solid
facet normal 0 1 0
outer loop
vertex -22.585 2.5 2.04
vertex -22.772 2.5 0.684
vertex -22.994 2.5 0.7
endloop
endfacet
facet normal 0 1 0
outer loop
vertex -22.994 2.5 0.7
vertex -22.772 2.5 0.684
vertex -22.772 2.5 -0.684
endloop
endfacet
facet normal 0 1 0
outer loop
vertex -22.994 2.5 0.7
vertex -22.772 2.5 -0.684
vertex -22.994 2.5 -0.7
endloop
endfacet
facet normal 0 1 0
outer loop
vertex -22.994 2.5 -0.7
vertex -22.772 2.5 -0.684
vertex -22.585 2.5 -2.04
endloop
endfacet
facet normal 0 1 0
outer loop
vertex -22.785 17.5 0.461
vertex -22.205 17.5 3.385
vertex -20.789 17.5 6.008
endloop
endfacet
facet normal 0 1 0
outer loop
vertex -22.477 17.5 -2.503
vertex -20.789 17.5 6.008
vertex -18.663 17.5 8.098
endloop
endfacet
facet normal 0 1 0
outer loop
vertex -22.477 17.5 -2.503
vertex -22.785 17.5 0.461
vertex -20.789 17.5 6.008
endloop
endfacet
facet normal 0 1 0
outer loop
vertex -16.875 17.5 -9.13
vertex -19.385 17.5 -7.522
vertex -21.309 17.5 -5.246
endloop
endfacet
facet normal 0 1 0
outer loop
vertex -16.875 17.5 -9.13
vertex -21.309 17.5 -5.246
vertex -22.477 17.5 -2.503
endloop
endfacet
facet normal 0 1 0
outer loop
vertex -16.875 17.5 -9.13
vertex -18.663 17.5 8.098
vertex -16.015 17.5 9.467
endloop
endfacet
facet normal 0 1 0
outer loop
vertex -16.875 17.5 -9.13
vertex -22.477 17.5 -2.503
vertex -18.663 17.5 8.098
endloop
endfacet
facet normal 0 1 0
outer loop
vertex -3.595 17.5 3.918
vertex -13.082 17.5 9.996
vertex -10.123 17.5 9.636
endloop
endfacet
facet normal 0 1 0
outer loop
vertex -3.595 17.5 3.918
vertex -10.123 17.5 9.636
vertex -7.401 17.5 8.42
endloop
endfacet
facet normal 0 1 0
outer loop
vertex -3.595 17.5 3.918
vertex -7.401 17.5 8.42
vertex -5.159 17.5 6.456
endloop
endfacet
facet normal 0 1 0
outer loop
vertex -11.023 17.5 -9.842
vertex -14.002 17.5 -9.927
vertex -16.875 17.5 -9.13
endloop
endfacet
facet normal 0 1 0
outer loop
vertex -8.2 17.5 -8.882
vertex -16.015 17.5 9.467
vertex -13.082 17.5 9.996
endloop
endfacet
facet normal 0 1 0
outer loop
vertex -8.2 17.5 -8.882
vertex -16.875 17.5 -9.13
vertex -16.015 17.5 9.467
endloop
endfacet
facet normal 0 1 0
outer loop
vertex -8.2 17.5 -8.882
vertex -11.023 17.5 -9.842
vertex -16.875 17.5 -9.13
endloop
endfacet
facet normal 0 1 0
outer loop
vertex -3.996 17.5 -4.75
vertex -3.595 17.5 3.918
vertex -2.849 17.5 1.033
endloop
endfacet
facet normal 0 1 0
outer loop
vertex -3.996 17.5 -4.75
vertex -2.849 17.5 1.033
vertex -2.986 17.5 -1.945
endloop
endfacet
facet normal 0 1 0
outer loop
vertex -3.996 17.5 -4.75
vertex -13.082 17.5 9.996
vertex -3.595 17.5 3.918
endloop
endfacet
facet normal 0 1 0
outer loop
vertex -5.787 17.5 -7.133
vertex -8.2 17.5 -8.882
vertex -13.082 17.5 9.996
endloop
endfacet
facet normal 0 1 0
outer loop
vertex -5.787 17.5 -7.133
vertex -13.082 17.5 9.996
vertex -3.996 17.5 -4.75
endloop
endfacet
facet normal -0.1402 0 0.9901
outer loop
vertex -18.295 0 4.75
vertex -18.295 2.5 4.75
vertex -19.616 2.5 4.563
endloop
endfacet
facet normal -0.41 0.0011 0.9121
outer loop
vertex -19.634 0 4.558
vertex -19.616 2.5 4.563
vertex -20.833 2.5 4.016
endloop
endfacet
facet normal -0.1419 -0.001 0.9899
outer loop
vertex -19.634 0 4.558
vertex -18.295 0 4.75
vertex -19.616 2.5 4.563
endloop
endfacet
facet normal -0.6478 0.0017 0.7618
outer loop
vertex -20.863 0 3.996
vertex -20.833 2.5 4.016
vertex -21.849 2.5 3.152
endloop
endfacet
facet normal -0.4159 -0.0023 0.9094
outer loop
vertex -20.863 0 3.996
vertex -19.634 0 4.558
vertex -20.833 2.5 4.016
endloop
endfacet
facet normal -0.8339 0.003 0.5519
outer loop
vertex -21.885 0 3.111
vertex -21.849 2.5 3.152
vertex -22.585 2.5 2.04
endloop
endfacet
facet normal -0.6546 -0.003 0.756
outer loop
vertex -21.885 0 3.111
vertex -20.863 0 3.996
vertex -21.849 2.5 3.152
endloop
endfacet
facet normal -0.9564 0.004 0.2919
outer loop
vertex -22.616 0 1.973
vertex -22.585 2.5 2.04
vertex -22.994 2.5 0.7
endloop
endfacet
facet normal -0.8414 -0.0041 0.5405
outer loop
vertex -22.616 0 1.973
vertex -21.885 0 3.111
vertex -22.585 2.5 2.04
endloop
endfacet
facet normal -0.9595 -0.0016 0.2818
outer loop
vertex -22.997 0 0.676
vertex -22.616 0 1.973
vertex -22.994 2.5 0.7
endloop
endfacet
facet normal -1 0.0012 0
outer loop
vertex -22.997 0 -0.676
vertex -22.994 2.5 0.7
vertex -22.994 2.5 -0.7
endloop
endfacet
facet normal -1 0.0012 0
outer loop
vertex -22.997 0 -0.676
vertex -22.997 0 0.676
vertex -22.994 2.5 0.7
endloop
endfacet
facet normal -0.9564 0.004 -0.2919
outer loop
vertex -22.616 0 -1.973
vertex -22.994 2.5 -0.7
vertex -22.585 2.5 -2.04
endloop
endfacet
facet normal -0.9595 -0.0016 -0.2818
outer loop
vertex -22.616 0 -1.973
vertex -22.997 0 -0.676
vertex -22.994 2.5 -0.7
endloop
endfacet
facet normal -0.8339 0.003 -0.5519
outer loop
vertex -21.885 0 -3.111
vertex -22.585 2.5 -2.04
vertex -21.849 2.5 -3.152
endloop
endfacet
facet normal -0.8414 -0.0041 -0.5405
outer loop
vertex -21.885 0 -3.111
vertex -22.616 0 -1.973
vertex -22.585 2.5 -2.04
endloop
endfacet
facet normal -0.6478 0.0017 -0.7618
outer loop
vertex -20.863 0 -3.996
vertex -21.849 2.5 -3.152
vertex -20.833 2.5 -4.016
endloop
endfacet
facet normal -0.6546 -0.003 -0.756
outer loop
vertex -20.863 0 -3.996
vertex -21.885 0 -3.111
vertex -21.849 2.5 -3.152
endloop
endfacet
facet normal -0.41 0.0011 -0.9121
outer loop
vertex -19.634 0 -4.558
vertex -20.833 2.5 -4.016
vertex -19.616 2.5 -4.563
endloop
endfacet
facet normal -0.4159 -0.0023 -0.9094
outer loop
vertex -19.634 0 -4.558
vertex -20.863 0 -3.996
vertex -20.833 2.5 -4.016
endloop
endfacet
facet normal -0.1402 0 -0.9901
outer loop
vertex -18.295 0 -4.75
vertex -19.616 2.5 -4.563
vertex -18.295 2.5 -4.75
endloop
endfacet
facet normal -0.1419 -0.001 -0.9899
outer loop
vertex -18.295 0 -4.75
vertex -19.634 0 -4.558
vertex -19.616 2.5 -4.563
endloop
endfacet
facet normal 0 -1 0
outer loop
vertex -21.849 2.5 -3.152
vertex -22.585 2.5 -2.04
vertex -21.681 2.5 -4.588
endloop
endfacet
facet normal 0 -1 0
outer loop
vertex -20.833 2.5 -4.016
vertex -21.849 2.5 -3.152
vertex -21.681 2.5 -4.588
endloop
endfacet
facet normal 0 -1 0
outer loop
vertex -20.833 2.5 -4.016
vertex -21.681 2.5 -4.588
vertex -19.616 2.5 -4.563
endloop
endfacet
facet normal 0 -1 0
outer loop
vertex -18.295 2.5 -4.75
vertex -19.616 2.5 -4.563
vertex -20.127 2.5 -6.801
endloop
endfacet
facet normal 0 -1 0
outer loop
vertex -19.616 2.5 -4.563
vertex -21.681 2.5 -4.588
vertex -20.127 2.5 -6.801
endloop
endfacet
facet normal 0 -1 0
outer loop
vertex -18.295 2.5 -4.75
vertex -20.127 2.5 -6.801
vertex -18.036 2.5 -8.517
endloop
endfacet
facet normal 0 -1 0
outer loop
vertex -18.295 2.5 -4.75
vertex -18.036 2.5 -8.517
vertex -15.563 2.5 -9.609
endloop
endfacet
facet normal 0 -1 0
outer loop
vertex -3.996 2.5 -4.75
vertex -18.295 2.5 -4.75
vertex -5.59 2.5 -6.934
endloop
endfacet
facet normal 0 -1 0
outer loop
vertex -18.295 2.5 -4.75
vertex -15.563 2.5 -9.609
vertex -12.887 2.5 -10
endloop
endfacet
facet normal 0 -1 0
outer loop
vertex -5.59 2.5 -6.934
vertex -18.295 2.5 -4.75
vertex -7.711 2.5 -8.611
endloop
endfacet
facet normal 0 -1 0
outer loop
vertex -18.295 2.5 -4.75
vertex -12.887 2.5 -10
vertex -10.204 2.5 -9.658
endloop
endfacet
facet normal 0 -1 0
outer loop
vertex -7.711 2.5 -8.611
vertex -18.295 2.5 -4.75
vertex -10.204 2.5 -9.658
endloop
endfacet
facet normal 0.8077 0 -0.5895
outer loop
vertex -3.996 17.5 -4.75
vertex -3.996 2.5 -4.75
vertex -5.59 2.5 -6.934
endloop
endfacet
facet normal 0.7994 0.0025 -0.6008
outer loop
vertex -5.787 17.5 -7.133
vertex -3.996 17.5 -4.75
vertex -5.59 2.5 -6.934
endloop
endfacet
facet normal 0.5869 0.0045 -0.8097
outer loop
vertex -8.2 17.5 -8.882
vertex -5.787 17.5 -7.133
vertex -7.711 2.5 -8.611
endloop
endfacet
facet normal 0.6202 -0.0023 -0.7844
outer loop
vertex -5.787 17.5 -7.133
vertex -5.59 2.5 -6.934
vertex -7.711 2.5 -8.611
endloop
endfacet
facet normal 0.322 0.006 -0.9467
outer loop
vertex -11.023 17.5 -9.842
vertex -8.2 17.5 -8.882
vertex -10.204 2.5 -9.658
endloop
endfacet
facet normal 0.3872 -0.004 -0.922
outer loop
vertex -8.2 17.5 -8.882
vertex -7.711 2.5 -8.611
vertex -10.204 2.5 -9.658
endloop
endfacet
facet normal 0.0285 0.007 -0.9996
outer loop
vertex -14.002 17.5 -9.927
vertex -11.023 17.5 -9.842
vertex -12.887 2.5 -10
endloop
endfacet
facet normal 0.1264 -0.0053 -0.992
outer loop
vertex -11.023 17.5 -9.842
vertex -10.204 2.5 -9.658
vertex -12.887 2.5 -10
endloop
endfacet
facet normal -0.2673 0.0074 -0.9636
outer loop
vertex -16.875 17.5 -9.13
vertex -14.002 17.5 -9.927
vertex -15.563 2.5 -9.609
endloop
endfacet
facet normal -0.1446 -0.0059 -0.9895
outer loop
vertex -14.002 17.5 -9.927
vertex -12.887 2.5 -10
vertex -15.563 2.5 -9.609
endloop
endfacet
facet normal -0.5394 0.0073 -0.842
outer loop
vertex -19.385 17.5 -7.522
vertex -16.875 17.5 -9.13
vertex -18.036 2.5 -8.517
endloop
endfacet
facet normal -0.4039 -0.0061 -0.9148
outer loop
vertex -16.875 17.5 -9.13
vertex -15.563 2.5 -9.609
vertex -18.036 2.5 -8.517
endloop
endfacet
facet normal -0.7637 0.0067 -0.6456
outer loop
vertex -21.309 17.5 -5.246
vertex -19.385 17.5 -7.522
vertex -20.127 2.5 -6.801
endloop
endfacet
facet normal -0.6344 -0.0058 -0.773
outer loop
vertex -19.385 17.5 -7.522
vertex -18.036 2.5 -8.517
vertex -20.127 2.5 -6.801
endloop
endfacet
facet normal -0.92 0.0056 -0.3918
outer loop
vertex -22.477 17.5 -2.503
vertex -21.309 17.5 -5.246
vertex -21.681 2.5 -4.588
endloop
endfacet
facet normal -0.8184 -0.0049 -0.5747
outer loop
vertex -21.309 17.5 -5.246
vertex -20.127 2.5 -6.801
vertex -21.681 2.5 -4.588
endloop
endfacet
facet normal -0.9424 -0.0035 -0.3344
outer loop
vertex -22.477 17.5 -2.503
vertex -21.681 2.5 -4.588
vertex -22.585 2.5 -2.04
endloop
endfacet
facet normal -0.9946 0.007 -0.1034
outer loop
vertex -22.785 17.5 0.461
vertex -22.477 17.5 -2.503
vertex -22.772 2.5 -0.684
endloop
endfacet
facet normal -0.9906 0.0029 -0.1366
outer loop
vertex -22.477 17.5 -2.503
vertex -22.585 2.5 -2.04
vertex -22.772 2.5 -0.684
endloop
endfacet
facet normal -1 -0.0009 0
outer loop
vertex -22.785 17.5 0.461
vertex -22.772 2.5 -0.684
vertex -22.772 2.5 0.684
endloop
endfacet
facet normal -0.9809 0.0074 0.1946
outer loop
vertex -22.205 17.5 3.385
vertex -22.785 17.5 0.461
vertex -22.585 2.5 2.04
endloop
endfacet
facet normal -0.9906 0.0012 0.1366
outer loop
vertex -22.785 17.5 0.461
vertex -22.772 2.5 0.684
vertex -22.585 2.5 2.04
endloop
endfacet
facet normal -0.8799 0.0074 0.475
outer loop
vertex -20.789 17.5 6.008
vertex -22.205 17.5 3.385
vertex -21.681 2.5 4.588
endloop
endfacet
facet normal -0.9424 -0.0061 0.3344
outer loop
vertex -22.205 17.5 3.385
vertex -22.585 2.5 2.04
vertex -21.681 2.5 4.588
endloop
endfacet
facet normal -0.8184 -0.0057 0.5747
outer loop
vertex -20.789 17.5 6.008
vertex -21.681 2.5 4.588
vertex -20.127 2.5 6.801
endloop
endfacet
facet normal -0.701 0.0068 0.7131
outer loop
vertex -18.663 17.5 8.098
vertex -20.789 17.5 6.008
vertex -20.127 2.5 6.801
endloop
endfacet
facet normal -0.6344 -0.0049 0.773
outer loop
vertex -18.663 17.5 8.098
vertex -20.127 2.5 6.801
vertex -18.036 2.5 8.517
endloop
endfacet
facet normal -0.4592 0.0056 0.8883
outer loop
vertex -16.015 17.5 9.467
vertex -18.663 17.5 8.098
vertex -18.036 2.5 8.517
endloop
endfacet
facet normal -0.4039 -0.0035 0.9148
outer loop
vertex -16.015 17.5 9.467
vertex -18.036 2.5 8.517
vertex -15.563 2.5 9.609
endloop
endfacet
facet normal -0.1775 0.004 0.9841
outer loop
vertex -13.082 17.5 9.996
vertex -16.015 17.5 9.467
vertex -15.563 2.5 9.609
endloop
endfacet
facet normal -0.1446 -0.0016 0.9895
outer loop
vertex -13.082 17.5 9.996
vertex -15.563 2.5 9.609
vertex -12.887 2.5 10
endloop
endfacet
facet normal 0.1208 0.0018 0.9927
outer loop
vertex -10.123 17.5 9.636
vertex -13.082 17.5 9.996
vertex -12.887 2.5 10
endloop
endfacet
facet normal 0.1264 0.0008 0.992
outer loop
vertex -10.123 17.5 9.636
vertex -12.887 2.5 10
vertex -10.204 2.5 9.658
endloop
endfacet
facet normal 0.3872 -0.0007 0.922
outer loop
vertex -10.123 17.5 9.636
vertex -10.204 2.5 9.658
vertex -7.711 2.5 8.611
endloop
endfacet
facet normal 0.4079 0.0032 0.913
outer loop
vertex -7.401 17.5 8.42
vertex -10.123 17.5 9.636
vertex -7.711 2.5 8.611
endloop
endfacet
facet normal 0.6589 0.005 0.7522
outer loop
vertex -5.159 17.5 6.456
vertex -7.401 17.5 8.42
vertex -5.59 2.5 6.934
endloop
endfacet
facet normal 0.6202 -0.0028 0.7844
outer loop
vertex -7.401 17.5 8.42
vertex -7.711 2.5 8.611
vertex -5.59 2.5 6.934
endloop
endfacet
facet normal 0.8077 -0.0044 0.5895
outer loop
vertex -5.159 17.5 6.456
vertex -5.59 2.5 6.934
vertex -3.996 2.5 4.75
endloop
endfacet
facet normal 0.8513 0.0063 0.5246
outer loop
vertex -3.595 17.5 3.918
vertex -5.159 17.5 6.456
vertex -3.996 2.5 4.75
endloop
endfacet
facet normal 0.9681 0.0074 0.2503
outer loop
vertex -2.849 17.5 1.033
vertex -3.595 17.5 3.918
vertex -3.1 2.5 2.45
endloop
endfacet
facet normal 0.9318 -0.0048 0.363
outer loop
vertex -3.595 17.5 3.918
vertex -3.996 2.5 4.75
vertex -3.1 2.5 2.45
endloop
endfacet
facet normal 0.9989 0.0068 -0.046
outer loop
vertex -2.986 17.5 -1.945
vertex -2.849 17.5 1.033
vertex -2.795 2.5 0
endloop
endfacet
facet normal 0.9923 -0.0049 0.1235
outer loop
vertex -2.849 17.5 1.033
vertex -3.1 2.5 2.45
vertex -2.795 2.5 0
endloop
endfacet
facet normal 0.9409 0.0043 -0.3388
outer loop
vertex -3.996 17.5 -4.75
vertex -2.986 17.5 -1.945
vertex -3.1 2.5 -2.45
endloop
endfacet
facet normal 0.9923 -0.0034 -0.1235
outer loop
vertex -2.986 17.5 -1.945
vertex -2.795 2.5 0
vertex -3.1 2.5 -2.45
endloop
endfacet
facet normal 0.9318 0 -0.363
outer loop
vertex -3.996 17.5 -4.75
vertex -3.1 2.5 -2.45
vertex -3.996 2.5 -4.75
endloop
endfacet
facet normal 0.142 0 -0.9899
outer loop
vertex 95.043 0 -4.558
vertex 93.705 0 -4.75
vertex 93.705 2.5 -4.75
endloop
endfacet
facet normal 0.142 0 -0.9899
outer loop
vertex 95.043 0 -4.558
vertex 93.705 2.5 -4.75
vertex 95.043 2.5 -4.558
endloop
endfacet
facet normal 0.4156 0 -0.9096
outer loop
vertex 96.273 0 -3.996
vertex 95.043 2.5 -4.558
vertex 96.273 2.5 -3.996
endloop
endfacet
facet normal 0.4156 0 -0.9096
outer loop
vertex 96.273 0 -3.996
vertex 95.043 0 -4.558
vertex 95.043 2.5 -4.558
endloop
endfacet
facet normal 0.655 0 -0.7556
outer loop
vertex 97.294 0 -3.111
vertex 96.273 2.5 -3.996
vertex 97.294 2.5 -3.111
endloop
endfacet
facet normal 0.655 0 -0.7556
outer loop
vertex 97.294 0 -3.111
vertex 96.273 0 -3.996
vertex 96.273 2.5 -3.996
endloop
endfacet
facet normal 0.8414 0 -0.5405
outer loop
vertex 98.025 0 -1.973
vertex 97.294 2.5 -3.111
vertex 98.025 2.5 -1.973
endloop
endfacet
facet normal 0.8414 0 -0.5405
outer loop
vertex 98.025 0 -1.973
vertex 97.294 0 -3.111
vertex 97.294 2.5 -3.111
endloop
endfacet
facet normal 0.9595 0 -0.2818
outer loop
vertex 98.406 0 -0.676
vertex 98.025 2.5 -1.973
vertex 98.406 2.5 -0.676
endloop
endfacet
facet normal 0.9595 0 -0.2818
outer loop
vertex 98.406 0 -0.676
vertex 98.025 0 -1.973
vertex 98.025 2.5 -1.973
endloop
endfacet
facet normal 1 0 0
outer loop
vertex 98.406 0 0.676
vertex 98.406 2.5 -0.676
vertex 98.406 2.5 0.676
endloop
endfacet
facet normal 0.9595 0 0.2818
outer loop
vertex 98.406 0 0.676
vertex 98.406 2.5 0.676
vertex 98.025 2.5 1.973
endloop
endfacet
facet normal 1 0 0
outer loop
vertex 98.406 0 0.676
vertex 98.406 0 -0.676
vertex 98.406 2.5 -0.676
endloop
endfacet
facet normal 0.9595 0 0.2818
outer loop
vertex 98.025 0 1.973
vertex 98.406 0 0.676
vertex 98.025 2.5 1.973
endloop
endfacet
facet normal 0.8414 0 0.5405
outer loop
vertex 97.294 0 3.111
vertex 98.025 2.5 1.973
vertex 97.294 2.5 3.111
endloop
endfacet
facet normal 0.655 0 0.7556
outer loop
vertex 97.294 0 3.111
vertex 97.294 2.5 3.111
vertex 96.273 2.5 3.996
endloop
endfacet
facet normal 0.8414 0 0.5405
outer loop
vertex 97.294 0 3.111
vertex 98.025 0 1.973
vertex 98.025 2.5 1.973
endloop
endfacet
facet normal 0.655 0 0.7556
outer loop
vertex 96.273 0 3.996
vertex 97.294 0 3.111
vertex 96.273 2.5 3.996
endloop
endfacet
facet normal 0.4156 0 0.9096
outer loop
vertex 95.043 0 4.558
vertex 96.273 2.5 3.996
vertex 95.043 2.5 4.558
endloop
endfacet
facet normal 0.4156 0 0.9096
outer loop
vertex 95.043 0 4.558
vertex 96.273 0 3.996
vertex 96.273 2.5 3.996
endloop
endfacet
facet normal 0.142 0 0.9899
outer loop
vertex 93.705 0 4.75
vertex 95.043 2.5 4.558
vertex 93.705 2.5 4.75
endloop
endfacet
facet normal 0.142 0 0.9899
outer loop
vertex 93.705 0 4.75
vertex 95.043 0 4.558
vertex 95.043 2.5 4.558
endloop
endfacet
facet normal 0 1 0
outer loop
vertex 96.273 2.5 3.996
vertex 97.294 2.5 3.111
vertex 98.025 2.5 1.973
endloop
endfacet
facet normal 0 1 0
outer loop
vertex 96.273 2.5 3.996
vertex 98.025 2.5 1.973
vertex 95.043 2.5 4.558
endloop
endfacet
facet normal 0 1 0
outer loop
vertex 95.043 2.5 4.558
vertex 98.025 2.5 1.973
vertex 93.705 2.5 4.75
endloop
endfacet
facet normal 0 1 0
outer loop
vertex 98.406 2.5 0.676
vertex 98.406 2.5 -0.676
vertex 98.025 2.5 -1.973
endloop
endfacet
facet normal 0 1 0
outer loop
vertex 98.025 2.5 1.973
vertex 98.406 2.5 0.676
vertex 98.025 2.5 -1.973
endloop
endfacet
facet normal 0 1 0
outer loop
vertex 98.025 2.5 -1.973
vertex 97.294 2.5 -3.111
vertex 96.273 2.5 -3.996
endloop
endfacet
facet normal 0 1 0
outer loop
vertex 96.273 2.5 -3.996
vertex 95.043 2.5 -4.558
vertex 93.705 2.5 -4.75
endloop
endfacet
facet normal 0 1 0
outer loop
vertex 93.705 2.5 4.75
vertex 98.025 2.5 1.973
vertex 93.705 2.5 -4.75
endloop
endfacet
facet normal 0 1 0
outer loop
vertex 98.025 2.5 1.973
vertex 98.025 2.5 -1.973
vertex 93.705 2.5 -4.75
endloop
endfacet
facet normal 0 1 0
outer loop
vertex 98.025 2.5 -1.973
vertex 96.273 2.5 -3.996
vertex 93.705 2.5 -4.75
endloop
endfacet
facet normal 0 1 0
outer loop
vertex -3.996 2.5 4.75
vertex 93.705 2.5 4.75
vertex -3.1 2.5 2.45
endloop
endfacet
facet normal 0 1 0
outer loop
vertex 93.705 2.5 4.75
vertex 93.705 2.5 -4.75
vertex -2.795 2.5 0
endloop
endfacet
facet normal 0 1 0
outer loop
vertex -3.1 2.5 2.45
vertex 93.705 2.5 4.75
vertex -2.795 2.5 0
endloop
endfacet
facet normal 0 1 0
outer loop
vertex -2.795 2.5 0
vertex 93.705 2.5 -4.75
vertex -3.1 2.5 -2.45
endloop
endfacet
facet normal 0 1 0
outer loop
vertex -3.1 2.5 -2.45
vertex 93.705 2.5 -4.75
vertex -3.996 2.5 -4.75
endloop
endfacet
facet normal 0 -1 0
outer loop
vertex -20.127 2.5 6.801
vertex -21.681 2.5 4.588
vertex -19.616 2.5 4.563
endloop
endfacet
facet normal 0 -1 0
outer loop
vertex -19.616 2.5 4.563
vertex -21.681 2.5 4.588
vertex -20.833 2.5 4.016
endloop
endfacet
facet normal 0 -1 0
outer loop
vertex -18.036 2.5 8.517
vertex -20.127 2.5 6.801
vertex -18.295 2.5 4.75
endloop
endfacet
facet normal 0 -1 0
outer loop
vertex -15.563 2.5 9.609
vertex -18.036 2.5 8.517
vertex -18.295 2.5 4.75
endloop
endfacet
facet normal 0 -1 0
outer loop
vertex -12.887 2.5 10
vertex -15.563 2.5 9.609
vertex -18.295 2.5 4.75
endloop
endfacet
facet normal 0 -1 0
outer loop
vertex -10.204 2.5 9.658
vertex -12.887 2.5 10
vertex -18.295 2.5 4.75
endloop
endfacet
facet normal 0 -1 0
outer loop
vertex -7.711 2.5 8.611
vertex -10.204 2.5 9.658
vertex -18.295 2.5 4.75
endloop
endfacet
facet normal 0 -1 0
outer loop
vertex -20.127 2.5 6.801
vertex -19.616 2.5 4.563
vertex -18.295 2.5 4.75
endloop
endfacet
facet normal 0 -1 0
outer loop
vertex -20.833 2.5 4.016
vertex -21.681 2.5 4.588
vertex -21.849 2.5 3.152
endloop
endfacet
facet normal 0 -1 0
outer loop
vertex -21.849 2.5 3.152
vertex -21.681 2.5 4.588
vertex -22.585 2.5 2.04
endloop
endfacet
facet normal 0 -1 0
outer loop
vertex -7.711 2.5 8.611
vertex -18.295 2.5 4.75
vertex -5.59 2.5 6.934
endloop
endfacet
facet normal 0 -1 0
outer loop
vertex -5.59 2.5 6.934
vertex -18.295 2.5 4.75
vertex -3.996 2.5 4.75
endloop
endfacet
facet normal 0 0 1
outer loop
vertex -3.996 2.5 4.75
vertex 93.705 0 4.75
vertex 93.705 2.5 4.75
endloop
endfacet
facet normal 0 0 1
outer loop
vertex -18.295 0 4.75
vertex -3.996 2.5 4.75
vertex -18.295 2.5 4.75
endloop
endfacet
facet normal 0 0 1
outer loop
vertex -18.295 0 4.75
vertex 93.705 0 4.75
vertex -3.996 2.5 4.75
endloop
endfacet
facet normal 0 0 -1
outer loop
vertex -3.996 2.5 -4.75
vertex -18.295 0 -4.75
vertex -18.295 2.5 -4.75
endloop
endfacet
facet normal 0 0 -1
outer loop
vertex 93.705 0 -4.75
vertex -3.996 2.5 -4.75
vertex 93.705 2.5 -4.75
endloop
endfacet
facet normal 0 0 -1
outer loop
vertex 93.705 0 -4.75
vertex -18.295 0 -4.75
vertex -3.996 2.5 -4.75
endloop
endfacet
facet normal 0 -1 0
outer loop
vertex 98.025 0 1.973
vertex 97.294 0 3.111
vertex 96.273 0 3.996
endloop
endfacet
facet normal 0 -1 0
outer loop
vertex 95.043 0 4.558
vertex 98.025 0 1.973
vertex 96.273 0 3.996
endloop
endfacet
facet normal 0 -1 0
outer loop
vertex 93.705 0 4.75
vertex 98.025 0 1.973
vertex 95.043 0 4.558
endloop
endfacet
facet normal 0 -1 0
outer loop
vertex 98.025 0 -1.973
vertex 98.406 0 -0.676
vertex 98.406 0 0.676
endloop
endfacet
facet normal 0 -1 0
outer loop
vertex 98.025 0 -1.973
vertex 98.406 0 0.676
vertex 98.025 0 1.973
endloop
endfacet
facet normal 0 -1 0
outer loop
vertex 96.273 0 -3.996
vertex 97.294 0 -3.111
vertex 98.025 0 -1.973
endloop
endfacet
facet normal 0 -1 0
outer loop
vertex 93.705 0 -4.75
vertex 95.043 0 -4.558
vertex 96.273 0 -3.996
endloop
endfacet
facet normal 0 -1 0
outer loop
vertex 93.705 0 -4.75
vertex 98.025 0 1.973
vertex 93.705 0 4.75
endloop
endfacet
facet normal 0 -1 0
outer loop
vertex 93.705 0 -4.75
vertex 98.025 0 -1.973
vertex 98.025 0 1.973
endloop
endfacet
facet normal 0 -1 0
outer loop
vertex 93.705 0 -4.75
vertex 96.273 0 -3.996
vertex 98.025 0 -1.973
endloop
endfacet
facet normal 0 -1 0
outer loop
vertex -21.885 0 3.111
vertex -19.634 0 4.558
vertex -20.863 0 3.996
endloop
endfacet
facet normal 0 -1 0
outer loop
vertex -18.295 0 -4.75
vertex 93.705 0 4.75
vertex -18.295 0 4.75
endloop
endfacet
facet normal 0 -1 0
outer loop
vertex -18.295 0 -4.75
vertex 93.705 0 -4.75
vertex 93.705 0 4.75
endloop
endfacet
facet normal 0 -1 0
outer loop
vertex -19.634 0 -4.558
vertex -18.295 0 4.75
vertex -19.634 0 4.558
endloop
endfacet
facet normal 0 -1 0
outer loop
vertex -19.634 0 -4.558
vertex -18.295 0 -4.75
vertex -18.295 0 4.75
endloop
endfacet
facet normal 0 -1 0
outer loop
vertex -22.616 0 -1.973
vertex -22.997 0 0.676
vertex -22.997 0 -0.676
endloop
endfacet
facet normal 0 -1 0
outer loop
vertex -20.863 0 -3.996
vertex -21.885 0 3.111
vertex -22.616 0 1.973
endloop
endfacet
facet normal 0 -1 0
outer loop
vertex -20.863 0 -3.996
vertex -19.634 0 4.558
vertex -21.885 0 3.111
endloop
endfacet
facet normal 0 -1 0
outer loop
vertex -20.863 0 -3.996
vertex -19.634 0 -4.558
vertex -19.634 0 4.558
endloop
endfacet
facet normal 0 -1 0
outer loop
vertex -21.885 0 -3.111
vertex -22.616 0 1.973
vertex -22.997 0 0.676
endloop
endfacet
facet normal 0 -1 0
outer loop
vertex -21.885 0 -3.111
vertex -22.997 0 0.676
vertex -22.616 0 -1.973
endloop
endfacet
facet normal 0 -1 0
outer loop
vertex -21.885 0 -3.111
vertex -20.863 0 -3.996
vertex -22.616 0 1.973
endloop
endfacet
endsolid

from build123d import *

# Parameters (mm, degrees)
BOSS_EXTRUDE1_DEPTH     = 2.5
SKETCH2_R               = 10
BOSS_EXTRUDE2_DEPTH     = 15
CUT_EXTRUDE1_DEPTH      = 101.496505017
CUT_EXTRUDE1_DEPTH_BACK = 2.5
SKETCH3_R               = 7.5
BOSS_EXTRUDE3_START     = 2.5
SKETCH4_R               = 7.5
BOSS_EXTRUDE3_DEPTH     = 2.5


with BuildPart() as part:
    # Sketch1 → Boss-Extrude1 (new body)
    with BuildSketch(Plane(origin=(0, 0, 0), x_dir=(1, 0, 0), z_dir=(0, 1, 0))):
        with BuildLine():
            Line((-18.295454545, 4.75), (93.704545455, 4.75))
            ThreePointArc((93.704545455, 4.75), (98.454545455, 0), (93.704545455, -4.75))
            Line((93.704545455, -4.75), (-18.295454545, -4.75))
            ThreePointArc((-18.295454545, -4.75), (-23.045454545, 0), (-18.295454545, 4.75))
        make_face()
    extrude(amount=BOSS_EXTRUDE1_DEPTH)

    # Sketch2 → Boss-Extrude2 (add)
    with BuildSketch(Plane(origin=(0, 2.5, 0), x_dir=(1, 0, 0), z_dir=(0, 1, 0))):
        with Locations(Location((-12.795454545, 0, 0), (0, 0, 28.359350028))):
            Circle(SKETCH2_R)
    extrude(amount=BOSS_EXTRUDE2_DEPTH)

    # Sketch3 → Cut-Extrude1 (cut, two sides: drawn at the far end of the back side and taken through both)
    with BuildSketch(Plane(origin=(0, 17.5, 0), x_dir=(1, 0, 0), z_dir=(0, 1, 0)).offset(-CUT_EXTRUDE1_DEPTH_BACK)):
        with Locations(Location((-12.795454545, 0, 0), (0, 0, 90))):
            Circle(SKETCH3_R)
    extrude(amount=CUT_EXTRUDE1_DEPTH + CUT_EXTRUDE1_DEPTH_BACK, mode=Mode.SUBTRACT)

    # Sketch4 → Boss-Extrude3 (add)
    with BuildSketch(Plane(origin=(0, 15, 0), x_dir=(1, 0, 0), z_dir=(0, 1, 0)).offset(BOSS_EXTRUDE3_START)):
        with Locations((-12.795454545, 0)):
            Circle(SKETCH4_R)
    extrude(amount=-BOSS_EXTRUDE3_DEPTH)


solid = part.part
